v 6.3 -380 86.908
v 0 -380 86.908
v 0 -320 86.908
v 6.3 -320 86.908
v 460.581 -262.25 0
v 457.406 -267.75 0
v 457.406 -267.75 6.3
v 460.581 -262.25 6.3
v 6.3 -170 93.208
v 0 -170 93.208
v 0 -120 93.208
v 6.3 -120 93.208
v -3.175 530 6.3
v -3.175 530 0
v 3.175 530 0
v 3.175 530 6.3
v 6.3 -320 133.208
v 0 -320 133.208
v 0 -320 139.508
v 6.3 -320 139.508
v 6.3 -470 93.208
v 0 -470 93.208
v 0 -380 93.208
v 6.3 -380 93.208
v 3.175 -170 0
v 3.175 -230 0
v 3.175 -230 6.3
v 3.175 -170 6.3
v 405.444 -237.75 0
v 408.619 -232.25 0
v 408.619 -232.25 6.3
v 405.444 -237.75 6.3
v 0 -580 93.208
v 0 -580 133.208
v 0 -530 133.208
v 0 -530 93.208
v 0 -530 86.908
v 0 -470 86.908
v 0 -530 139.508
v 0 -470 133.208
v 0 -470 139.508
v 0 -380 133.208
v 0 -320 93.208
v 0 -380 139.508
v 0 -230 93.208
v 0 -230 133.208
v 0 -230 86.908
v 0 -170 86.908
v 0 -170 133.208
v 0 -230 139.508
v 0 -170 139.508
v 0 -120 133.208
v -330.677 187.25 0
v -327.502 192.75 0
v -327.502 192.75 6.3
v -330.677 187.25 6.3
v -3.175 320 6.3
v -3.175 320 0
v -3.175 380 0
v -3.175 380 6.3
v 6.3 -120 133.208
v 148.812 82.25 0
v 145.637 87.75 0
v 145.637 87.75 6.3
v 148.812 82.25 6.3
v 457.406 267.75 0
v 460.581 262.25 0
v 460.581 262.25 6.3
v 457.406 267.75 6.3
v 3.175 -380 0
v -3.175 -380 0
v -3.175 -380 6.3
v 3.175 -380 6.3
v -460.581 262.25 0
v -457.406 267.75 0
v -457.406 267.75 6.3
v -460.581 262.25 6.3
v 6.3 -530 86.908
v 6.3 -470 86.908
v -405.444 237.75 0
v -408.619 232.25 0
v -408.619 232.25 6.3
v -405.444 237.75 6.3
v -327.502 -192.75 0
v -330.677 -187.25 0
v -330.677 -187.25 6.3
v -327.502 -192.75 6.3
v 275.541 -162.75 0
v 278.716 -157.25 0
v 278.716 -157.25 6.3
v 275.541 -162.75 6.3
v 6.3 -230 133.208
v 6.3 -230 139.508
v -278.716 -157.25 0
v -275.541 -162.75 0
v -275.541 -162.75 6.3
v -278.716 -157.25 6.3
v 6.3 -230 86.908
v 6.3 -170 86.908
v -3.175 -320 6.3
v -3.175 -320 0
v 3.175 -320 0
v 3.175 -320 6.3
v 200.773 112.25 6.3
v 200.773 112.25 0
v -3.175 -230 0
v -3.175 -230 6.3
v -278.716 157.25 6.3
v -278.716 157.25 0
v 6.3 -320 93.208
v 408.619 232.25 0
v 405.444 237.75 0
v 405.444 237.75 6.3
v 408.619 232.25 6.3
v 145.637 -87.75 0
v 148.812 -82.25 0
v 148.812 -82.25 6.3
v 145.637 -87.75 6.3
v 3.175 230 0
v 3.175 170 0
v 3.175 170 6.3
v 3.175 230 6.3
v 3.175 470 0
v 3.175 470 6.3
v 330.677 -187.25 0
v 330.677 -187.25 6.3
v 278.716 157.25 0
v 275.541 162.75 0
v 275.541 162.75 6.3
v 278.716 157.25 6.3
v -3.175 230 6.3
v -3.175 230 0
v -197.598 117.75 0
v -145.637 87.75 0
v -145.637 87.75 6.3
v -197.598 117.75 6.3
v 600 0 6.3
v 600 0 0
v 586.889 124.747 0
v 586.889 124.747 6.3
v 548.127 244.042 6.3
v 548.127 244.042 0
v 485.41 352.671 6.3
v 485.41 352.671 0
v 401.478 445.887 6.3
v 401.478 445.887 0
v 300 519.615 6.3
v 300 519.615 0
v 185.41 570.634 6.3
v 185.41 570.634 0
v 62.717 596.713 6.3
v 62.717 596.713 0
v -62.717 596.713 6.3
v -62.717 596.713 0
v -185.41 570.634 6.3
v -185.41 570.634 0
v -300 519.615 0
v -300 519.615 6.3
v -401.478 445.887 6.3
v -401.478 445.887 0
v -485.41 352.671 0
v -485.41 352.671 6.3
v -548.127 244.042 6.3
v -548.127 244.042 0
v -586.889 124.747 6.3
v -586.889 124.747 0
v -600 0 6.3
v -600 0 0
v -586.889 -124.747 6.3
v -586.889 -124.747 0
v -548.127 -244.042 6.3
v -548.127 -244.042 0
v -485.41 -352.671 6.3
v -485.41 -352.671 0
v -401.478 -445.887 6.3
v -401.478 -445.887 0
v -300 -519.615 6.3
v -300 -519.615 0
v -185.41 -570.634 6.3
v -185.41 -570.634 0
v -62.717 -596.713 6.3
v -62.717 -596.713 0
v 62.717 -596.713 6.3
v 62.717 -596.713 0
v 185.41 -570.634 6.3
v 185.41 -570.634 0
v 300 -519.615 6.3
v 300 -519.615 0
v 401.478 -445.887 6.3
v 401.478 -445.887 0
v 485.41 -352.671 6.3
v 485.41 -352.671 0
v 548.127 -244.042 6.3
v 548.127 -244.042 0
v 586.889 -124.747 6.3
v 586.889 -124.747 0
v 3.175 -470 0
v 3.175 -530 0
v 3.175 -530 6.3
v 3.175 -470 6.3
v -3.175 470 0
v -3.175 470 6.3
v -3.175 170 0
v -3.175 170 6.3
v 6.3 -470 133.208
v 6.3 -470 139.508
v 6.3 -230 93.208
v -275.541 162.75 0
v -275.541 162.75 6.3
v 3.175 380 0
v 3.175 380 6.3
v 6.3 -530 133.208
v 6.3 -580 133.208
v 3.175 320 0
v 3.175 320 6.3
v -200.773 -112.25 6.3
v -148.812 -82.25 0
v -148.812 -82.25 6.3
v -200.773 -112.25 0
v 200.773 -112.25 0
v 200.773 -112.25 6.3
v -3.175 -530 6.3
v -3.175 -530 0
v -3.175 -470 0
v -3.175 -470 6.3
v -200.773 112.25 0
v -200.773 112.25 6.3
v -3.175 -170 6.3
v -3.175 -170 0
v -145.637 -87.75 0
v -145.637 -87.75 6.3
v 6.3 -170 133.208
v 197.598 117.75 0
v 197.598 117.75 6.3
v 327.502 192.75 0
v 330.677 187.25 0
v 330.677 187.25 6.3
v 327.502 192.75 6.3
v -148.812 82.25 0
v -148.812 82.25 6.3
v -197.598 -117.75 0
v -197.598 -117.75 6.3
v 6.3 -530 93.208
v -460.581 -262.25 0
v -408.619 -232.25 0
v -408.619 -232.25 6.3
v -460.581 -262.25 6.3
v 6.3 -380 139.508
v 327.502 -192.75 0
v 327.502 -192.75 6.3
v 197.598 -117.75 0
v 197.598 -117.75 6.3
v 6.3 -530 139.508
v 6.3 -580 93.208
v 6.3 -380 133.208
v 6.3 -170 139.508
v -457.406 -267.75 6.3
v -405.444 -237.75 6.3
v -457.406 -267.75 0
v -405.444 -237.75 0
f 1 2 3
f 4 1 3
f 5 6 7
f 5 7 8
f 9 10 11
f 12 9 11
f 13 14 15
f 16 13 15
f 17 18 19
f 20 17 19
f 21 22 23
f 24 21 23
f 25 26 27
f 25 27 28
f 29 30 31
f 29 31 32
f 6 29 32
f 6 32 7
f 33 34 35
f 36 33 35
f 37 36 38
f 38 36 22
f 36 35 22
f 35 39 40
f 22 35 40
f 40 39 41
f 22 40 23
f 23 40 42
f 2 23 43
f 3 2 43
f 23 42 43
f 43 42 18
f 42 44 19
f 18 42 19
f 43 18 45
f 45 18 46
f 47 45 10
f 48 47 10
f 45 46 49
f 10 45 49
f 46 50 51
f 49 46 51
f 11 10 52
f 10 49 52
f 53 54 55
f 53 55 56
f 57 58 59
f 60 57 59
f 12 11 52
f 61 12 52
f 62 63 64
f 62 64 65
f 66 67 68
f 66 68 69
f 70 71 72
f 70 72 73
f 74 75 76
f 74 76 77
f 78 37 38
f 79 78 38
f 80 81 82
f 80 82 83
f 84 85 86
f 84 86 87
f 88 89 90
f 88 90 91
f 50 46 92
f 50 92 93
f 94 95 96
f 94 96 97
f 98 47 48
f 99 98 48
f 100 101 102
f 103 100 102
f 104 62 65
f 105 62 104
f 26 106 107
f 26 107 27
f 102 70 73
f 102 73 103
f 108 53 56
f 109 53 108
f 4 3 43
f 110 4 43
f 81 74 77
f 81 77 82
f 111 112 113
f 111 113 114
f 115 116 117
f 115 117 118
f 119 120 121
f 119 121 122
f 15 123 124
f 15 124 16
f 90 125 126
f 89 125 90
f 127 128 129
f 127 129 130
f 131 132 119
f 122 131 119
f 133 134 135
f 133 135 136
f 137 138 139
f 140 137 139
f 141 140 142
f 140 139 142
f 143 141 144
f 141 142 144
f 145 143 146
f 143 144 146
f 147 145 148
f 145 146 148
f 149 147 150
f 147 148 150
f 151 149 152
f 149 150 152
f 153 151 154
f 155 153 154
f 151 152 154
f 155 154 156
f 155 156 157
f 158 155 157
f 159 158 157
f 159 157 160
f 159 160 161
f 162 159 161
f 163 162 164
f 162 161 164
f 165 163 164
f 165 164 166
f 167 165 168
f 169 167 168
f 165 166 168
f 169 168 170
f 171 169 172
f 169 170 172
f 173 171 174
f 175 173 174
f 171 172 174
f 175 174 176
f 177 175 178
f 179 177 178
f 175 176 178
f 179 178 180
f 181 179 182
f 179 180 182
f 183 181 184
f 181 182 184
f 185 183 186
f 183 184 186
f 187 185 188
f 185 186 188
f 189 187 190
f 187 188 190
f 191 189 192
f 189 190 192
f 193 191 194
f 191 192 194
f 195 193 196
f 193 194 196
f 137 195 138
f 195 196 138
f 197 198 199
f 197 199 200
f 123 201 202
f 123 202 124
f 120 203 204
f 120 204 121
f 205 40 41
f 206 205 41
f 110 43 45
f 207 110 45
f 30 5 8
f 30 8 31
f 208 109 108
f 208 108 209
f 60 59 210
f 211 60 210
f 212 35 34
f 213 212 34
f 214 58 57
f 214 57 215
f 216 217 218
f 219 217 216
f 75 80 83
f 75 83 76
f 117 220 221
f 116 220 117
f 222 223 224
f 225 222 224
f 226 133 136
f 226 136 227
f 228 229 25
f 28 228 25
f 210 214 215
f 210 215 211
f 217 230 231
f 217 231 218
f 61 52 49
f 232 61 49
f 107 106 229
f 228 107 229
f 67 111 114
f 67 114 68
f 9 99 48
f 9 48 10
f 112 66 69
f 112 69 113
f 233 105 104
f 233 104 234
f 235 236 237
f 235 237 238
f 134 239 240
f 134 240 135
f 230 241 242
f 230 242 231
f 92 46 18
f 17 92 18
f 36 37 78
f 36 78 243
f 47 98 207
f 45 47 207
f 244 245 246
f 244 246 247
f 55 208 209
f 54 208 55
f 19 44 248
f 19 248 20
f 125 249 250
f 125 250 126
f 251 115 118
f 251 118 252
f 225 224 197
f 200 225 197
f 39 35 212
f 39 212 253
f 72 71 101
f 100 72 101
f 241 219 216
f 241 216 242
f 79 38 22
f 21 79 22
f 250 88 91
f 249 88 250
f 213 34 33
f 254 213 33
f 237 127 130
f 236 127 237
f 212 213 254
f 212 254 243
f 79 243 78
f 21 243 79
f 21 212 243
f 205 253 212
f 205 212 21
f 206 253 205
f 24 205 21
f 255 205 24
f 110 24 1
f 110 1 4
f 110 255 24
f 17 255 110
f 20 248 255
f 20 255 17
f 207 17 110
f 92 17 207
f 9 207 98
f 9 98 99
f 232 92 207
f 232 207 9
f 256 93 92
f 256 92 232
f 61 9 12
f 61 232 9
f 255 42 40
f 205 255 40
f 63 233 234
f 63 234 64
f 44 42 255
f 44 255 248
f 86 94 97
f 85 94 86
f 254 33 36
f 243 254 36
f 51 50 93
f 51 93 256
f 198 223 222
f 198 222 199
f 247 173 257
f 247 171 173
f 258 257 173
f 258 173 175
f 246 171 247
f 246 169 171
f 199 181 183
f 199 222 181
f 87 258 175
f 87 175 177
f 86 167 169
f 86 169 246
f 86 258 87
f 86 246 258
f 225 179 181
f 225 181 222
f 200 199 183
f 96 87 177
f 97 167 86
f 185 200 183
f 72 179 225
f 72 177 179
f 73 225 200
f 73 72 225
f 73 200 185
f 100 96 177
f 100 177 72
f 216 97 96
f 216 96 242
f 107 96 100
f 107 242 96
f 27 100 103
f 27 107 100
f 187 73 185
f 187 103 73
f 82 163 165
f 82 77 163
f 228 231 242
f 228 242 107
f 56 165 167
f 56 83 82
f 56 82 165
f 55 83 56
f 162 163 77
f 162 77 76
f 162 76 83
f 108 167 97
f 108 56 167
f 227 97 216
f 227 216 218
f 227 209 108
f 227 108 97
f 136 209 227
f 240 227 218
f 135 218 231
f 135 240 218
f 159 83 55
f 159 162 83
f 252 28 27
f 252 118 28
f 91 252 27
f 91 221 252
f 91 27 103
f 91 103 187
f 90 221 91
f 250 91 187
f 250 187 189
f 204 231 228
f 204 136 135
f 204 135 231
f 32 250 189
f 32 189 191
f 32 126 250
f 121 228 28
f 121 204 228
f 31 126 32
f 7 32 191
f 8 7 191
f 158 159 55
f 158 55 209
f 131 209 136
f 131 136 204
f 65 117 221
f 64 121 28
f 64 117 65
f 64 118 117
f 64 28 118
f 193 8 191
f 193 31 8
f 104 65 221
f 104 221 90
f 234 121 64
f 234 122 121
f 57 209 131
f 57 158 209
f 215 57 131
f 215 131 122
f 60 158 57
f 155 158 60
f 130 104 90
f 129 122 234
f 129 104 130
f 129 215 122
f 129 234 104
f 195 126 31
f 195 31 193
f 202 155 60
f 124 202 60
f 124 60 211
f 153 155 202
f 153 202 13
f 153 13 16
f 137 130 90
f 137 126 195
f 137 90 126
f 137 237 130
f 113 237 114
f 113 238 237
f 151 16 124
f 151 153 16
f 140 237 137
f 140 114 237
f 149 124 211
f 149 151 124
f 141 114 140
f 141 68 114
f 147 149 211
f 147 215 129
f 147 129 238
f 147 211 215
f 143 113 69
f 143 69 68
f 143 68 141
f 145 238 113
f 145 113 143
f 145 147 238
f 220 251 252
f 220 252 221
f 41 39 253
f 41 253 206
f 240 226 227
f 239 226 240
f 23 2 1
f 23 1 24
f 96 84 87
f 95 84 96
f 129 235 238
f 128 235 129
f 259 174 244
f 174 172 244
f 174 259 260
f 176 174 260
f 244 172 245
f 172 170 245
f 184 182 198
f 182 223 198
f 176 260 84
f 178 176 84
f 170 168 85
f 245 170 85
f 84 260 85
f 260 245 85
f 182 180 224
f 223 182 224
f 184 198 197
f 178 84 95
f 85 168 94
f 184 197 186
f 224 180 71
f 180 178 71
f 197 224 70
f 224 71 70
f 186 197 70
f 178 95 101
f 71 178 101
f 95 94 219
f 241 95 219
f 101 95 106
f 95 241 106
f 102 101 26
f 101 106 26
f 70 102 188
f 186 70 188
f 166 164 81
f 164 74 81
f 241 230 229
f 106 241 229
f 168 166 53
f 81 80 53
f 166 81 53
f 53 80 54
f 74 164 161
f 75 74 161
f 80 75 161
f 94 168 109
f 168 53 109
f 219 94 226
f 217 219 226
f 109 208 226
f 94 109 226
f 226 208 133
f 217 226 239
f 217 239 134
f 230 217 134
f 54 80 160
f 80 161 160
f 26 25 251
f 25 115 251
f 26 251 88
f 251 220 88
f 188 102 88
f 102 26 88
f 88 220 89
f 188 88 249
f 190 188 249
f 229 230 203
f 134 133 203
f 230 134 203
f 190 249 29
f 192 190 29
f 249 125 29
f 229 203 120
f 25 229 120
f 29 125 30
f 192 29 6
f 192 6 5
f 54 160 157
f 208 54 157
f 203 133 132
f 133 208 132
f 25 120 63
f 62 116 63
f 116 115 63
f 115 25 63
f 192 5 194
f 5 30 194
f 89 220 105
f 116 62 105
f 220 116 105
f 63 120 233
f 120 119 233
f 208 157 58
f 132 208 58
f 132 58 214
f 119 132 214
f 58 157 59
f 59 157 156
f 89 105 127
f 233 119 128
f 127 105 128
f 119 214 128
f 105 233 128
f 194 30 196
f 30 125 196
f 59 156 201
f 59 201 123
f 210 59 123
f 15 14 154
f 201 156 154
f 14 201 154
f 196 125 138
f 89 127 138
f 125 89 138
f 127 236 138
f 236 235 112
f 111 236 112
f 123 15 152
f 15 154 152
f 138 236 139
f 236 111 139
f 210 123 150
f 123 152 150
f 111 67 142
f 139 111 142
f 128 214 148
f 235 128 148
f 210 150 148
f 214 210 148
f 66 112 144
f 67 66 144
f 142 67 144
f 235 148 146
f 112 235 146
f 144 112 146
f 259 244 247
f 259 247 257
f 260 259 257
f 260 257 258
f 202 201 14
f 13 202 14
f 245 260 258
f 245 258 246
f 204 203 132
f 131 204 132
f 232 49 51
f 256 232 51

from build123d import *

# Parameters (mm, degrees)
F0_R     = 600
F2_DEPTH = 6.3
F1_W     = 6.35
F1_H     = 60
F3_DEPTH = 25
F4_W     = 60
F4_H     = 6.3
F5_DEPTH = 6.3


with BuildPart() as f2:
    # F0 (on Top) → F2 (new body)
    with BuildSketch(Plane.XY):
        Circle(F0_R)
    extrude(amount=F2_DEPTH)

    # F1 (on Top) → F3 (cut)
    with BuildSketch(Plane.XY):
        with Locations((0, 200)):
            Rectangle(F1_W, F1_H)
        with Locations((0, 350)):
            Rectangle(F1_W, F1_H)
        with Locations((0, 500)):
            Rectangle(F1_W, F1_H)
        Polygon((-460.5809640058, 262.250369343), (-408.6194397787, 232.250369343), (-405.4444397787, 237.749630657), (-457.4059640058, 267.749630657), align=None)
        Polygon((-197.5983428704, 117.749630657), (-200.7733428704, 112.250369343), (-148.8118186434, 82.250369343), (-145.6368186434, 87.749630657), align=None)
        Polygon((-330.6771534381, 187.250369343), (-278.715629211, 157.250369343), (-275.540629211, 162.749630657), (-327.5021534381, 192.749630657), align=None)
        Polygon((-457.4059640058, -267.749630657), (-405.4444397787, -237.749630657), (-408.6194397787, -232.250369343), (-460.5809640058, -262.250369343), align=None)
        Polygon((-200.7733428704, -112.250369343), (-197.5983428704, -117.749630657), (-145.6368186434, -87.749630657), (-148.8118186434, -82.250369343), align=None)
        Polygon((-327.5021534381, -192.749630657), (-275.540629211, -162.749630657), (-278.715629211, -157.250369343), (-330.6771534381, -187.250369343), align=None)
        with Locations((0, -500)):
            Rectangle(F1_W, F1_H)
        with Locations((0, -200)):
            Rectangle(F1_W, F1_H)
        with Locations((0, -350)):
            Rectangle(F1_W, F1_H)
        Polygon((460.5809640058, -262.250369343), (408.6194397787, -232.250369343), (405.4444397787, -237.749630657), (457.4059640058, -267.749630657), align=None)
        Polygon((197.5983428704, -117.749630657), (200.7733428704, -112.250369343), (148.8118186434, -82.250369343), (145.6368186434, -87.749630657), align=None)
        Polygon((330.6771534381, -187.250369343), (278.715629211, -157.250369343), (275.540629211, -162.749630657), (327.5021534381, -192.749630657), align=None)
        Polygon((457.4059640058, 267.749630657), (405.4444397787, 237.749630657), (408.6194397787, 232.250369343), (460.5809640058, 262.250369343), align=None)
        Polygon((200.7733428704, 112.250369343), (197.5983428704, 117.749630657), (145.6368186434, 87.749630657), (148.8118186434, 82.250369343), align=None)
        Polygon((327.5021534381, 192.749630657), (275.540629211, 162.749630657), (278.715629211, 157.250369343), (330.6771534381, 187.250369343), align=None)
    extrude(amount=F3_DEPTH, mode=Mode.SUBTRACT)


with BuildPart() as f5:
    # F4 (on Right) → F5 (new body)
    with BuildSketch(Plane.YZ):
        Polygon((-580, 133.2076589066), (-580, 113.2076589066), (-120, 113.2076589066), (-120, 133.2076589066), (-170, 133.2076589066), (-170, 126.9076589066), (-230, 126.9076589066), (-230, 133.2076589066), (-320, 133.2076589066), (-320, 126.9076589066), (-380, 126.9076589066), (-380, 133.2076589066), (-470, 133.2076589066), (-470, 126.9076589066), (-530, 126.9076589066), (-530, 133.2076589066), align=None)
        Polygon((-120, 113.2076589066), (-580, 113.2076589066), (-580, 93.2076589066), (-530, 93.2076589066), (-530, 99.5076589066), (-470, 99.5076589066), (-470, 93.2076589066), (-380, 93.2076589066), (-380, 99.5076589066), (-320, 99.5076589066), (-320, 93.2076589066), (-230, 93.2076589066), (-230, 99.5076589066), (-170, 99.5076589066), (-170, 93.2076589066), (-120, 93.2076589066), align=None)
        with Locations((-500, 96.3576589066)):
            Rectangle(F4_W, F4_H)
        with Locations((-500, 90.0576589066)):
            Rectangle(F4_W, F4_H)
        with Locations((-500, 130.0576589066)):
            Rectangle(F4_W, F4_H)
        with Locations((-500, 136.3576589066)):
            Rectangle(F4_W, F4_H)
        with Locations((-200, 90.0576589066)):
            Rectangle(F4_W, F4_H)
        with Locations((-200, 96.3576589066)):
            Rectangle(F4_W, F4_H)
        with Locations((-200, 136.3576589066)):
            Rectangle(F4_W, F4_H)
        with Locations((-200, 130.0576589066)):
            Rectangle(F4_W, F4_H)
        with Locations((-350, 96.3576589066)):
            Rectangle(F4_W, F4_H)
        with Locations((-350, 90.0576589066)):
            Rectangle(F4_W, F4_H)
        with Locations((-350, 130.0576589066)):
            Rectangle(F4_W, F4_H)
        with Locations((-350, 136.3576589066)):
            Rectangle(F4_W, F4_H)
    extrude(amount=F5_DEPTH)


solid = Compound([f2.part, f5.part])
